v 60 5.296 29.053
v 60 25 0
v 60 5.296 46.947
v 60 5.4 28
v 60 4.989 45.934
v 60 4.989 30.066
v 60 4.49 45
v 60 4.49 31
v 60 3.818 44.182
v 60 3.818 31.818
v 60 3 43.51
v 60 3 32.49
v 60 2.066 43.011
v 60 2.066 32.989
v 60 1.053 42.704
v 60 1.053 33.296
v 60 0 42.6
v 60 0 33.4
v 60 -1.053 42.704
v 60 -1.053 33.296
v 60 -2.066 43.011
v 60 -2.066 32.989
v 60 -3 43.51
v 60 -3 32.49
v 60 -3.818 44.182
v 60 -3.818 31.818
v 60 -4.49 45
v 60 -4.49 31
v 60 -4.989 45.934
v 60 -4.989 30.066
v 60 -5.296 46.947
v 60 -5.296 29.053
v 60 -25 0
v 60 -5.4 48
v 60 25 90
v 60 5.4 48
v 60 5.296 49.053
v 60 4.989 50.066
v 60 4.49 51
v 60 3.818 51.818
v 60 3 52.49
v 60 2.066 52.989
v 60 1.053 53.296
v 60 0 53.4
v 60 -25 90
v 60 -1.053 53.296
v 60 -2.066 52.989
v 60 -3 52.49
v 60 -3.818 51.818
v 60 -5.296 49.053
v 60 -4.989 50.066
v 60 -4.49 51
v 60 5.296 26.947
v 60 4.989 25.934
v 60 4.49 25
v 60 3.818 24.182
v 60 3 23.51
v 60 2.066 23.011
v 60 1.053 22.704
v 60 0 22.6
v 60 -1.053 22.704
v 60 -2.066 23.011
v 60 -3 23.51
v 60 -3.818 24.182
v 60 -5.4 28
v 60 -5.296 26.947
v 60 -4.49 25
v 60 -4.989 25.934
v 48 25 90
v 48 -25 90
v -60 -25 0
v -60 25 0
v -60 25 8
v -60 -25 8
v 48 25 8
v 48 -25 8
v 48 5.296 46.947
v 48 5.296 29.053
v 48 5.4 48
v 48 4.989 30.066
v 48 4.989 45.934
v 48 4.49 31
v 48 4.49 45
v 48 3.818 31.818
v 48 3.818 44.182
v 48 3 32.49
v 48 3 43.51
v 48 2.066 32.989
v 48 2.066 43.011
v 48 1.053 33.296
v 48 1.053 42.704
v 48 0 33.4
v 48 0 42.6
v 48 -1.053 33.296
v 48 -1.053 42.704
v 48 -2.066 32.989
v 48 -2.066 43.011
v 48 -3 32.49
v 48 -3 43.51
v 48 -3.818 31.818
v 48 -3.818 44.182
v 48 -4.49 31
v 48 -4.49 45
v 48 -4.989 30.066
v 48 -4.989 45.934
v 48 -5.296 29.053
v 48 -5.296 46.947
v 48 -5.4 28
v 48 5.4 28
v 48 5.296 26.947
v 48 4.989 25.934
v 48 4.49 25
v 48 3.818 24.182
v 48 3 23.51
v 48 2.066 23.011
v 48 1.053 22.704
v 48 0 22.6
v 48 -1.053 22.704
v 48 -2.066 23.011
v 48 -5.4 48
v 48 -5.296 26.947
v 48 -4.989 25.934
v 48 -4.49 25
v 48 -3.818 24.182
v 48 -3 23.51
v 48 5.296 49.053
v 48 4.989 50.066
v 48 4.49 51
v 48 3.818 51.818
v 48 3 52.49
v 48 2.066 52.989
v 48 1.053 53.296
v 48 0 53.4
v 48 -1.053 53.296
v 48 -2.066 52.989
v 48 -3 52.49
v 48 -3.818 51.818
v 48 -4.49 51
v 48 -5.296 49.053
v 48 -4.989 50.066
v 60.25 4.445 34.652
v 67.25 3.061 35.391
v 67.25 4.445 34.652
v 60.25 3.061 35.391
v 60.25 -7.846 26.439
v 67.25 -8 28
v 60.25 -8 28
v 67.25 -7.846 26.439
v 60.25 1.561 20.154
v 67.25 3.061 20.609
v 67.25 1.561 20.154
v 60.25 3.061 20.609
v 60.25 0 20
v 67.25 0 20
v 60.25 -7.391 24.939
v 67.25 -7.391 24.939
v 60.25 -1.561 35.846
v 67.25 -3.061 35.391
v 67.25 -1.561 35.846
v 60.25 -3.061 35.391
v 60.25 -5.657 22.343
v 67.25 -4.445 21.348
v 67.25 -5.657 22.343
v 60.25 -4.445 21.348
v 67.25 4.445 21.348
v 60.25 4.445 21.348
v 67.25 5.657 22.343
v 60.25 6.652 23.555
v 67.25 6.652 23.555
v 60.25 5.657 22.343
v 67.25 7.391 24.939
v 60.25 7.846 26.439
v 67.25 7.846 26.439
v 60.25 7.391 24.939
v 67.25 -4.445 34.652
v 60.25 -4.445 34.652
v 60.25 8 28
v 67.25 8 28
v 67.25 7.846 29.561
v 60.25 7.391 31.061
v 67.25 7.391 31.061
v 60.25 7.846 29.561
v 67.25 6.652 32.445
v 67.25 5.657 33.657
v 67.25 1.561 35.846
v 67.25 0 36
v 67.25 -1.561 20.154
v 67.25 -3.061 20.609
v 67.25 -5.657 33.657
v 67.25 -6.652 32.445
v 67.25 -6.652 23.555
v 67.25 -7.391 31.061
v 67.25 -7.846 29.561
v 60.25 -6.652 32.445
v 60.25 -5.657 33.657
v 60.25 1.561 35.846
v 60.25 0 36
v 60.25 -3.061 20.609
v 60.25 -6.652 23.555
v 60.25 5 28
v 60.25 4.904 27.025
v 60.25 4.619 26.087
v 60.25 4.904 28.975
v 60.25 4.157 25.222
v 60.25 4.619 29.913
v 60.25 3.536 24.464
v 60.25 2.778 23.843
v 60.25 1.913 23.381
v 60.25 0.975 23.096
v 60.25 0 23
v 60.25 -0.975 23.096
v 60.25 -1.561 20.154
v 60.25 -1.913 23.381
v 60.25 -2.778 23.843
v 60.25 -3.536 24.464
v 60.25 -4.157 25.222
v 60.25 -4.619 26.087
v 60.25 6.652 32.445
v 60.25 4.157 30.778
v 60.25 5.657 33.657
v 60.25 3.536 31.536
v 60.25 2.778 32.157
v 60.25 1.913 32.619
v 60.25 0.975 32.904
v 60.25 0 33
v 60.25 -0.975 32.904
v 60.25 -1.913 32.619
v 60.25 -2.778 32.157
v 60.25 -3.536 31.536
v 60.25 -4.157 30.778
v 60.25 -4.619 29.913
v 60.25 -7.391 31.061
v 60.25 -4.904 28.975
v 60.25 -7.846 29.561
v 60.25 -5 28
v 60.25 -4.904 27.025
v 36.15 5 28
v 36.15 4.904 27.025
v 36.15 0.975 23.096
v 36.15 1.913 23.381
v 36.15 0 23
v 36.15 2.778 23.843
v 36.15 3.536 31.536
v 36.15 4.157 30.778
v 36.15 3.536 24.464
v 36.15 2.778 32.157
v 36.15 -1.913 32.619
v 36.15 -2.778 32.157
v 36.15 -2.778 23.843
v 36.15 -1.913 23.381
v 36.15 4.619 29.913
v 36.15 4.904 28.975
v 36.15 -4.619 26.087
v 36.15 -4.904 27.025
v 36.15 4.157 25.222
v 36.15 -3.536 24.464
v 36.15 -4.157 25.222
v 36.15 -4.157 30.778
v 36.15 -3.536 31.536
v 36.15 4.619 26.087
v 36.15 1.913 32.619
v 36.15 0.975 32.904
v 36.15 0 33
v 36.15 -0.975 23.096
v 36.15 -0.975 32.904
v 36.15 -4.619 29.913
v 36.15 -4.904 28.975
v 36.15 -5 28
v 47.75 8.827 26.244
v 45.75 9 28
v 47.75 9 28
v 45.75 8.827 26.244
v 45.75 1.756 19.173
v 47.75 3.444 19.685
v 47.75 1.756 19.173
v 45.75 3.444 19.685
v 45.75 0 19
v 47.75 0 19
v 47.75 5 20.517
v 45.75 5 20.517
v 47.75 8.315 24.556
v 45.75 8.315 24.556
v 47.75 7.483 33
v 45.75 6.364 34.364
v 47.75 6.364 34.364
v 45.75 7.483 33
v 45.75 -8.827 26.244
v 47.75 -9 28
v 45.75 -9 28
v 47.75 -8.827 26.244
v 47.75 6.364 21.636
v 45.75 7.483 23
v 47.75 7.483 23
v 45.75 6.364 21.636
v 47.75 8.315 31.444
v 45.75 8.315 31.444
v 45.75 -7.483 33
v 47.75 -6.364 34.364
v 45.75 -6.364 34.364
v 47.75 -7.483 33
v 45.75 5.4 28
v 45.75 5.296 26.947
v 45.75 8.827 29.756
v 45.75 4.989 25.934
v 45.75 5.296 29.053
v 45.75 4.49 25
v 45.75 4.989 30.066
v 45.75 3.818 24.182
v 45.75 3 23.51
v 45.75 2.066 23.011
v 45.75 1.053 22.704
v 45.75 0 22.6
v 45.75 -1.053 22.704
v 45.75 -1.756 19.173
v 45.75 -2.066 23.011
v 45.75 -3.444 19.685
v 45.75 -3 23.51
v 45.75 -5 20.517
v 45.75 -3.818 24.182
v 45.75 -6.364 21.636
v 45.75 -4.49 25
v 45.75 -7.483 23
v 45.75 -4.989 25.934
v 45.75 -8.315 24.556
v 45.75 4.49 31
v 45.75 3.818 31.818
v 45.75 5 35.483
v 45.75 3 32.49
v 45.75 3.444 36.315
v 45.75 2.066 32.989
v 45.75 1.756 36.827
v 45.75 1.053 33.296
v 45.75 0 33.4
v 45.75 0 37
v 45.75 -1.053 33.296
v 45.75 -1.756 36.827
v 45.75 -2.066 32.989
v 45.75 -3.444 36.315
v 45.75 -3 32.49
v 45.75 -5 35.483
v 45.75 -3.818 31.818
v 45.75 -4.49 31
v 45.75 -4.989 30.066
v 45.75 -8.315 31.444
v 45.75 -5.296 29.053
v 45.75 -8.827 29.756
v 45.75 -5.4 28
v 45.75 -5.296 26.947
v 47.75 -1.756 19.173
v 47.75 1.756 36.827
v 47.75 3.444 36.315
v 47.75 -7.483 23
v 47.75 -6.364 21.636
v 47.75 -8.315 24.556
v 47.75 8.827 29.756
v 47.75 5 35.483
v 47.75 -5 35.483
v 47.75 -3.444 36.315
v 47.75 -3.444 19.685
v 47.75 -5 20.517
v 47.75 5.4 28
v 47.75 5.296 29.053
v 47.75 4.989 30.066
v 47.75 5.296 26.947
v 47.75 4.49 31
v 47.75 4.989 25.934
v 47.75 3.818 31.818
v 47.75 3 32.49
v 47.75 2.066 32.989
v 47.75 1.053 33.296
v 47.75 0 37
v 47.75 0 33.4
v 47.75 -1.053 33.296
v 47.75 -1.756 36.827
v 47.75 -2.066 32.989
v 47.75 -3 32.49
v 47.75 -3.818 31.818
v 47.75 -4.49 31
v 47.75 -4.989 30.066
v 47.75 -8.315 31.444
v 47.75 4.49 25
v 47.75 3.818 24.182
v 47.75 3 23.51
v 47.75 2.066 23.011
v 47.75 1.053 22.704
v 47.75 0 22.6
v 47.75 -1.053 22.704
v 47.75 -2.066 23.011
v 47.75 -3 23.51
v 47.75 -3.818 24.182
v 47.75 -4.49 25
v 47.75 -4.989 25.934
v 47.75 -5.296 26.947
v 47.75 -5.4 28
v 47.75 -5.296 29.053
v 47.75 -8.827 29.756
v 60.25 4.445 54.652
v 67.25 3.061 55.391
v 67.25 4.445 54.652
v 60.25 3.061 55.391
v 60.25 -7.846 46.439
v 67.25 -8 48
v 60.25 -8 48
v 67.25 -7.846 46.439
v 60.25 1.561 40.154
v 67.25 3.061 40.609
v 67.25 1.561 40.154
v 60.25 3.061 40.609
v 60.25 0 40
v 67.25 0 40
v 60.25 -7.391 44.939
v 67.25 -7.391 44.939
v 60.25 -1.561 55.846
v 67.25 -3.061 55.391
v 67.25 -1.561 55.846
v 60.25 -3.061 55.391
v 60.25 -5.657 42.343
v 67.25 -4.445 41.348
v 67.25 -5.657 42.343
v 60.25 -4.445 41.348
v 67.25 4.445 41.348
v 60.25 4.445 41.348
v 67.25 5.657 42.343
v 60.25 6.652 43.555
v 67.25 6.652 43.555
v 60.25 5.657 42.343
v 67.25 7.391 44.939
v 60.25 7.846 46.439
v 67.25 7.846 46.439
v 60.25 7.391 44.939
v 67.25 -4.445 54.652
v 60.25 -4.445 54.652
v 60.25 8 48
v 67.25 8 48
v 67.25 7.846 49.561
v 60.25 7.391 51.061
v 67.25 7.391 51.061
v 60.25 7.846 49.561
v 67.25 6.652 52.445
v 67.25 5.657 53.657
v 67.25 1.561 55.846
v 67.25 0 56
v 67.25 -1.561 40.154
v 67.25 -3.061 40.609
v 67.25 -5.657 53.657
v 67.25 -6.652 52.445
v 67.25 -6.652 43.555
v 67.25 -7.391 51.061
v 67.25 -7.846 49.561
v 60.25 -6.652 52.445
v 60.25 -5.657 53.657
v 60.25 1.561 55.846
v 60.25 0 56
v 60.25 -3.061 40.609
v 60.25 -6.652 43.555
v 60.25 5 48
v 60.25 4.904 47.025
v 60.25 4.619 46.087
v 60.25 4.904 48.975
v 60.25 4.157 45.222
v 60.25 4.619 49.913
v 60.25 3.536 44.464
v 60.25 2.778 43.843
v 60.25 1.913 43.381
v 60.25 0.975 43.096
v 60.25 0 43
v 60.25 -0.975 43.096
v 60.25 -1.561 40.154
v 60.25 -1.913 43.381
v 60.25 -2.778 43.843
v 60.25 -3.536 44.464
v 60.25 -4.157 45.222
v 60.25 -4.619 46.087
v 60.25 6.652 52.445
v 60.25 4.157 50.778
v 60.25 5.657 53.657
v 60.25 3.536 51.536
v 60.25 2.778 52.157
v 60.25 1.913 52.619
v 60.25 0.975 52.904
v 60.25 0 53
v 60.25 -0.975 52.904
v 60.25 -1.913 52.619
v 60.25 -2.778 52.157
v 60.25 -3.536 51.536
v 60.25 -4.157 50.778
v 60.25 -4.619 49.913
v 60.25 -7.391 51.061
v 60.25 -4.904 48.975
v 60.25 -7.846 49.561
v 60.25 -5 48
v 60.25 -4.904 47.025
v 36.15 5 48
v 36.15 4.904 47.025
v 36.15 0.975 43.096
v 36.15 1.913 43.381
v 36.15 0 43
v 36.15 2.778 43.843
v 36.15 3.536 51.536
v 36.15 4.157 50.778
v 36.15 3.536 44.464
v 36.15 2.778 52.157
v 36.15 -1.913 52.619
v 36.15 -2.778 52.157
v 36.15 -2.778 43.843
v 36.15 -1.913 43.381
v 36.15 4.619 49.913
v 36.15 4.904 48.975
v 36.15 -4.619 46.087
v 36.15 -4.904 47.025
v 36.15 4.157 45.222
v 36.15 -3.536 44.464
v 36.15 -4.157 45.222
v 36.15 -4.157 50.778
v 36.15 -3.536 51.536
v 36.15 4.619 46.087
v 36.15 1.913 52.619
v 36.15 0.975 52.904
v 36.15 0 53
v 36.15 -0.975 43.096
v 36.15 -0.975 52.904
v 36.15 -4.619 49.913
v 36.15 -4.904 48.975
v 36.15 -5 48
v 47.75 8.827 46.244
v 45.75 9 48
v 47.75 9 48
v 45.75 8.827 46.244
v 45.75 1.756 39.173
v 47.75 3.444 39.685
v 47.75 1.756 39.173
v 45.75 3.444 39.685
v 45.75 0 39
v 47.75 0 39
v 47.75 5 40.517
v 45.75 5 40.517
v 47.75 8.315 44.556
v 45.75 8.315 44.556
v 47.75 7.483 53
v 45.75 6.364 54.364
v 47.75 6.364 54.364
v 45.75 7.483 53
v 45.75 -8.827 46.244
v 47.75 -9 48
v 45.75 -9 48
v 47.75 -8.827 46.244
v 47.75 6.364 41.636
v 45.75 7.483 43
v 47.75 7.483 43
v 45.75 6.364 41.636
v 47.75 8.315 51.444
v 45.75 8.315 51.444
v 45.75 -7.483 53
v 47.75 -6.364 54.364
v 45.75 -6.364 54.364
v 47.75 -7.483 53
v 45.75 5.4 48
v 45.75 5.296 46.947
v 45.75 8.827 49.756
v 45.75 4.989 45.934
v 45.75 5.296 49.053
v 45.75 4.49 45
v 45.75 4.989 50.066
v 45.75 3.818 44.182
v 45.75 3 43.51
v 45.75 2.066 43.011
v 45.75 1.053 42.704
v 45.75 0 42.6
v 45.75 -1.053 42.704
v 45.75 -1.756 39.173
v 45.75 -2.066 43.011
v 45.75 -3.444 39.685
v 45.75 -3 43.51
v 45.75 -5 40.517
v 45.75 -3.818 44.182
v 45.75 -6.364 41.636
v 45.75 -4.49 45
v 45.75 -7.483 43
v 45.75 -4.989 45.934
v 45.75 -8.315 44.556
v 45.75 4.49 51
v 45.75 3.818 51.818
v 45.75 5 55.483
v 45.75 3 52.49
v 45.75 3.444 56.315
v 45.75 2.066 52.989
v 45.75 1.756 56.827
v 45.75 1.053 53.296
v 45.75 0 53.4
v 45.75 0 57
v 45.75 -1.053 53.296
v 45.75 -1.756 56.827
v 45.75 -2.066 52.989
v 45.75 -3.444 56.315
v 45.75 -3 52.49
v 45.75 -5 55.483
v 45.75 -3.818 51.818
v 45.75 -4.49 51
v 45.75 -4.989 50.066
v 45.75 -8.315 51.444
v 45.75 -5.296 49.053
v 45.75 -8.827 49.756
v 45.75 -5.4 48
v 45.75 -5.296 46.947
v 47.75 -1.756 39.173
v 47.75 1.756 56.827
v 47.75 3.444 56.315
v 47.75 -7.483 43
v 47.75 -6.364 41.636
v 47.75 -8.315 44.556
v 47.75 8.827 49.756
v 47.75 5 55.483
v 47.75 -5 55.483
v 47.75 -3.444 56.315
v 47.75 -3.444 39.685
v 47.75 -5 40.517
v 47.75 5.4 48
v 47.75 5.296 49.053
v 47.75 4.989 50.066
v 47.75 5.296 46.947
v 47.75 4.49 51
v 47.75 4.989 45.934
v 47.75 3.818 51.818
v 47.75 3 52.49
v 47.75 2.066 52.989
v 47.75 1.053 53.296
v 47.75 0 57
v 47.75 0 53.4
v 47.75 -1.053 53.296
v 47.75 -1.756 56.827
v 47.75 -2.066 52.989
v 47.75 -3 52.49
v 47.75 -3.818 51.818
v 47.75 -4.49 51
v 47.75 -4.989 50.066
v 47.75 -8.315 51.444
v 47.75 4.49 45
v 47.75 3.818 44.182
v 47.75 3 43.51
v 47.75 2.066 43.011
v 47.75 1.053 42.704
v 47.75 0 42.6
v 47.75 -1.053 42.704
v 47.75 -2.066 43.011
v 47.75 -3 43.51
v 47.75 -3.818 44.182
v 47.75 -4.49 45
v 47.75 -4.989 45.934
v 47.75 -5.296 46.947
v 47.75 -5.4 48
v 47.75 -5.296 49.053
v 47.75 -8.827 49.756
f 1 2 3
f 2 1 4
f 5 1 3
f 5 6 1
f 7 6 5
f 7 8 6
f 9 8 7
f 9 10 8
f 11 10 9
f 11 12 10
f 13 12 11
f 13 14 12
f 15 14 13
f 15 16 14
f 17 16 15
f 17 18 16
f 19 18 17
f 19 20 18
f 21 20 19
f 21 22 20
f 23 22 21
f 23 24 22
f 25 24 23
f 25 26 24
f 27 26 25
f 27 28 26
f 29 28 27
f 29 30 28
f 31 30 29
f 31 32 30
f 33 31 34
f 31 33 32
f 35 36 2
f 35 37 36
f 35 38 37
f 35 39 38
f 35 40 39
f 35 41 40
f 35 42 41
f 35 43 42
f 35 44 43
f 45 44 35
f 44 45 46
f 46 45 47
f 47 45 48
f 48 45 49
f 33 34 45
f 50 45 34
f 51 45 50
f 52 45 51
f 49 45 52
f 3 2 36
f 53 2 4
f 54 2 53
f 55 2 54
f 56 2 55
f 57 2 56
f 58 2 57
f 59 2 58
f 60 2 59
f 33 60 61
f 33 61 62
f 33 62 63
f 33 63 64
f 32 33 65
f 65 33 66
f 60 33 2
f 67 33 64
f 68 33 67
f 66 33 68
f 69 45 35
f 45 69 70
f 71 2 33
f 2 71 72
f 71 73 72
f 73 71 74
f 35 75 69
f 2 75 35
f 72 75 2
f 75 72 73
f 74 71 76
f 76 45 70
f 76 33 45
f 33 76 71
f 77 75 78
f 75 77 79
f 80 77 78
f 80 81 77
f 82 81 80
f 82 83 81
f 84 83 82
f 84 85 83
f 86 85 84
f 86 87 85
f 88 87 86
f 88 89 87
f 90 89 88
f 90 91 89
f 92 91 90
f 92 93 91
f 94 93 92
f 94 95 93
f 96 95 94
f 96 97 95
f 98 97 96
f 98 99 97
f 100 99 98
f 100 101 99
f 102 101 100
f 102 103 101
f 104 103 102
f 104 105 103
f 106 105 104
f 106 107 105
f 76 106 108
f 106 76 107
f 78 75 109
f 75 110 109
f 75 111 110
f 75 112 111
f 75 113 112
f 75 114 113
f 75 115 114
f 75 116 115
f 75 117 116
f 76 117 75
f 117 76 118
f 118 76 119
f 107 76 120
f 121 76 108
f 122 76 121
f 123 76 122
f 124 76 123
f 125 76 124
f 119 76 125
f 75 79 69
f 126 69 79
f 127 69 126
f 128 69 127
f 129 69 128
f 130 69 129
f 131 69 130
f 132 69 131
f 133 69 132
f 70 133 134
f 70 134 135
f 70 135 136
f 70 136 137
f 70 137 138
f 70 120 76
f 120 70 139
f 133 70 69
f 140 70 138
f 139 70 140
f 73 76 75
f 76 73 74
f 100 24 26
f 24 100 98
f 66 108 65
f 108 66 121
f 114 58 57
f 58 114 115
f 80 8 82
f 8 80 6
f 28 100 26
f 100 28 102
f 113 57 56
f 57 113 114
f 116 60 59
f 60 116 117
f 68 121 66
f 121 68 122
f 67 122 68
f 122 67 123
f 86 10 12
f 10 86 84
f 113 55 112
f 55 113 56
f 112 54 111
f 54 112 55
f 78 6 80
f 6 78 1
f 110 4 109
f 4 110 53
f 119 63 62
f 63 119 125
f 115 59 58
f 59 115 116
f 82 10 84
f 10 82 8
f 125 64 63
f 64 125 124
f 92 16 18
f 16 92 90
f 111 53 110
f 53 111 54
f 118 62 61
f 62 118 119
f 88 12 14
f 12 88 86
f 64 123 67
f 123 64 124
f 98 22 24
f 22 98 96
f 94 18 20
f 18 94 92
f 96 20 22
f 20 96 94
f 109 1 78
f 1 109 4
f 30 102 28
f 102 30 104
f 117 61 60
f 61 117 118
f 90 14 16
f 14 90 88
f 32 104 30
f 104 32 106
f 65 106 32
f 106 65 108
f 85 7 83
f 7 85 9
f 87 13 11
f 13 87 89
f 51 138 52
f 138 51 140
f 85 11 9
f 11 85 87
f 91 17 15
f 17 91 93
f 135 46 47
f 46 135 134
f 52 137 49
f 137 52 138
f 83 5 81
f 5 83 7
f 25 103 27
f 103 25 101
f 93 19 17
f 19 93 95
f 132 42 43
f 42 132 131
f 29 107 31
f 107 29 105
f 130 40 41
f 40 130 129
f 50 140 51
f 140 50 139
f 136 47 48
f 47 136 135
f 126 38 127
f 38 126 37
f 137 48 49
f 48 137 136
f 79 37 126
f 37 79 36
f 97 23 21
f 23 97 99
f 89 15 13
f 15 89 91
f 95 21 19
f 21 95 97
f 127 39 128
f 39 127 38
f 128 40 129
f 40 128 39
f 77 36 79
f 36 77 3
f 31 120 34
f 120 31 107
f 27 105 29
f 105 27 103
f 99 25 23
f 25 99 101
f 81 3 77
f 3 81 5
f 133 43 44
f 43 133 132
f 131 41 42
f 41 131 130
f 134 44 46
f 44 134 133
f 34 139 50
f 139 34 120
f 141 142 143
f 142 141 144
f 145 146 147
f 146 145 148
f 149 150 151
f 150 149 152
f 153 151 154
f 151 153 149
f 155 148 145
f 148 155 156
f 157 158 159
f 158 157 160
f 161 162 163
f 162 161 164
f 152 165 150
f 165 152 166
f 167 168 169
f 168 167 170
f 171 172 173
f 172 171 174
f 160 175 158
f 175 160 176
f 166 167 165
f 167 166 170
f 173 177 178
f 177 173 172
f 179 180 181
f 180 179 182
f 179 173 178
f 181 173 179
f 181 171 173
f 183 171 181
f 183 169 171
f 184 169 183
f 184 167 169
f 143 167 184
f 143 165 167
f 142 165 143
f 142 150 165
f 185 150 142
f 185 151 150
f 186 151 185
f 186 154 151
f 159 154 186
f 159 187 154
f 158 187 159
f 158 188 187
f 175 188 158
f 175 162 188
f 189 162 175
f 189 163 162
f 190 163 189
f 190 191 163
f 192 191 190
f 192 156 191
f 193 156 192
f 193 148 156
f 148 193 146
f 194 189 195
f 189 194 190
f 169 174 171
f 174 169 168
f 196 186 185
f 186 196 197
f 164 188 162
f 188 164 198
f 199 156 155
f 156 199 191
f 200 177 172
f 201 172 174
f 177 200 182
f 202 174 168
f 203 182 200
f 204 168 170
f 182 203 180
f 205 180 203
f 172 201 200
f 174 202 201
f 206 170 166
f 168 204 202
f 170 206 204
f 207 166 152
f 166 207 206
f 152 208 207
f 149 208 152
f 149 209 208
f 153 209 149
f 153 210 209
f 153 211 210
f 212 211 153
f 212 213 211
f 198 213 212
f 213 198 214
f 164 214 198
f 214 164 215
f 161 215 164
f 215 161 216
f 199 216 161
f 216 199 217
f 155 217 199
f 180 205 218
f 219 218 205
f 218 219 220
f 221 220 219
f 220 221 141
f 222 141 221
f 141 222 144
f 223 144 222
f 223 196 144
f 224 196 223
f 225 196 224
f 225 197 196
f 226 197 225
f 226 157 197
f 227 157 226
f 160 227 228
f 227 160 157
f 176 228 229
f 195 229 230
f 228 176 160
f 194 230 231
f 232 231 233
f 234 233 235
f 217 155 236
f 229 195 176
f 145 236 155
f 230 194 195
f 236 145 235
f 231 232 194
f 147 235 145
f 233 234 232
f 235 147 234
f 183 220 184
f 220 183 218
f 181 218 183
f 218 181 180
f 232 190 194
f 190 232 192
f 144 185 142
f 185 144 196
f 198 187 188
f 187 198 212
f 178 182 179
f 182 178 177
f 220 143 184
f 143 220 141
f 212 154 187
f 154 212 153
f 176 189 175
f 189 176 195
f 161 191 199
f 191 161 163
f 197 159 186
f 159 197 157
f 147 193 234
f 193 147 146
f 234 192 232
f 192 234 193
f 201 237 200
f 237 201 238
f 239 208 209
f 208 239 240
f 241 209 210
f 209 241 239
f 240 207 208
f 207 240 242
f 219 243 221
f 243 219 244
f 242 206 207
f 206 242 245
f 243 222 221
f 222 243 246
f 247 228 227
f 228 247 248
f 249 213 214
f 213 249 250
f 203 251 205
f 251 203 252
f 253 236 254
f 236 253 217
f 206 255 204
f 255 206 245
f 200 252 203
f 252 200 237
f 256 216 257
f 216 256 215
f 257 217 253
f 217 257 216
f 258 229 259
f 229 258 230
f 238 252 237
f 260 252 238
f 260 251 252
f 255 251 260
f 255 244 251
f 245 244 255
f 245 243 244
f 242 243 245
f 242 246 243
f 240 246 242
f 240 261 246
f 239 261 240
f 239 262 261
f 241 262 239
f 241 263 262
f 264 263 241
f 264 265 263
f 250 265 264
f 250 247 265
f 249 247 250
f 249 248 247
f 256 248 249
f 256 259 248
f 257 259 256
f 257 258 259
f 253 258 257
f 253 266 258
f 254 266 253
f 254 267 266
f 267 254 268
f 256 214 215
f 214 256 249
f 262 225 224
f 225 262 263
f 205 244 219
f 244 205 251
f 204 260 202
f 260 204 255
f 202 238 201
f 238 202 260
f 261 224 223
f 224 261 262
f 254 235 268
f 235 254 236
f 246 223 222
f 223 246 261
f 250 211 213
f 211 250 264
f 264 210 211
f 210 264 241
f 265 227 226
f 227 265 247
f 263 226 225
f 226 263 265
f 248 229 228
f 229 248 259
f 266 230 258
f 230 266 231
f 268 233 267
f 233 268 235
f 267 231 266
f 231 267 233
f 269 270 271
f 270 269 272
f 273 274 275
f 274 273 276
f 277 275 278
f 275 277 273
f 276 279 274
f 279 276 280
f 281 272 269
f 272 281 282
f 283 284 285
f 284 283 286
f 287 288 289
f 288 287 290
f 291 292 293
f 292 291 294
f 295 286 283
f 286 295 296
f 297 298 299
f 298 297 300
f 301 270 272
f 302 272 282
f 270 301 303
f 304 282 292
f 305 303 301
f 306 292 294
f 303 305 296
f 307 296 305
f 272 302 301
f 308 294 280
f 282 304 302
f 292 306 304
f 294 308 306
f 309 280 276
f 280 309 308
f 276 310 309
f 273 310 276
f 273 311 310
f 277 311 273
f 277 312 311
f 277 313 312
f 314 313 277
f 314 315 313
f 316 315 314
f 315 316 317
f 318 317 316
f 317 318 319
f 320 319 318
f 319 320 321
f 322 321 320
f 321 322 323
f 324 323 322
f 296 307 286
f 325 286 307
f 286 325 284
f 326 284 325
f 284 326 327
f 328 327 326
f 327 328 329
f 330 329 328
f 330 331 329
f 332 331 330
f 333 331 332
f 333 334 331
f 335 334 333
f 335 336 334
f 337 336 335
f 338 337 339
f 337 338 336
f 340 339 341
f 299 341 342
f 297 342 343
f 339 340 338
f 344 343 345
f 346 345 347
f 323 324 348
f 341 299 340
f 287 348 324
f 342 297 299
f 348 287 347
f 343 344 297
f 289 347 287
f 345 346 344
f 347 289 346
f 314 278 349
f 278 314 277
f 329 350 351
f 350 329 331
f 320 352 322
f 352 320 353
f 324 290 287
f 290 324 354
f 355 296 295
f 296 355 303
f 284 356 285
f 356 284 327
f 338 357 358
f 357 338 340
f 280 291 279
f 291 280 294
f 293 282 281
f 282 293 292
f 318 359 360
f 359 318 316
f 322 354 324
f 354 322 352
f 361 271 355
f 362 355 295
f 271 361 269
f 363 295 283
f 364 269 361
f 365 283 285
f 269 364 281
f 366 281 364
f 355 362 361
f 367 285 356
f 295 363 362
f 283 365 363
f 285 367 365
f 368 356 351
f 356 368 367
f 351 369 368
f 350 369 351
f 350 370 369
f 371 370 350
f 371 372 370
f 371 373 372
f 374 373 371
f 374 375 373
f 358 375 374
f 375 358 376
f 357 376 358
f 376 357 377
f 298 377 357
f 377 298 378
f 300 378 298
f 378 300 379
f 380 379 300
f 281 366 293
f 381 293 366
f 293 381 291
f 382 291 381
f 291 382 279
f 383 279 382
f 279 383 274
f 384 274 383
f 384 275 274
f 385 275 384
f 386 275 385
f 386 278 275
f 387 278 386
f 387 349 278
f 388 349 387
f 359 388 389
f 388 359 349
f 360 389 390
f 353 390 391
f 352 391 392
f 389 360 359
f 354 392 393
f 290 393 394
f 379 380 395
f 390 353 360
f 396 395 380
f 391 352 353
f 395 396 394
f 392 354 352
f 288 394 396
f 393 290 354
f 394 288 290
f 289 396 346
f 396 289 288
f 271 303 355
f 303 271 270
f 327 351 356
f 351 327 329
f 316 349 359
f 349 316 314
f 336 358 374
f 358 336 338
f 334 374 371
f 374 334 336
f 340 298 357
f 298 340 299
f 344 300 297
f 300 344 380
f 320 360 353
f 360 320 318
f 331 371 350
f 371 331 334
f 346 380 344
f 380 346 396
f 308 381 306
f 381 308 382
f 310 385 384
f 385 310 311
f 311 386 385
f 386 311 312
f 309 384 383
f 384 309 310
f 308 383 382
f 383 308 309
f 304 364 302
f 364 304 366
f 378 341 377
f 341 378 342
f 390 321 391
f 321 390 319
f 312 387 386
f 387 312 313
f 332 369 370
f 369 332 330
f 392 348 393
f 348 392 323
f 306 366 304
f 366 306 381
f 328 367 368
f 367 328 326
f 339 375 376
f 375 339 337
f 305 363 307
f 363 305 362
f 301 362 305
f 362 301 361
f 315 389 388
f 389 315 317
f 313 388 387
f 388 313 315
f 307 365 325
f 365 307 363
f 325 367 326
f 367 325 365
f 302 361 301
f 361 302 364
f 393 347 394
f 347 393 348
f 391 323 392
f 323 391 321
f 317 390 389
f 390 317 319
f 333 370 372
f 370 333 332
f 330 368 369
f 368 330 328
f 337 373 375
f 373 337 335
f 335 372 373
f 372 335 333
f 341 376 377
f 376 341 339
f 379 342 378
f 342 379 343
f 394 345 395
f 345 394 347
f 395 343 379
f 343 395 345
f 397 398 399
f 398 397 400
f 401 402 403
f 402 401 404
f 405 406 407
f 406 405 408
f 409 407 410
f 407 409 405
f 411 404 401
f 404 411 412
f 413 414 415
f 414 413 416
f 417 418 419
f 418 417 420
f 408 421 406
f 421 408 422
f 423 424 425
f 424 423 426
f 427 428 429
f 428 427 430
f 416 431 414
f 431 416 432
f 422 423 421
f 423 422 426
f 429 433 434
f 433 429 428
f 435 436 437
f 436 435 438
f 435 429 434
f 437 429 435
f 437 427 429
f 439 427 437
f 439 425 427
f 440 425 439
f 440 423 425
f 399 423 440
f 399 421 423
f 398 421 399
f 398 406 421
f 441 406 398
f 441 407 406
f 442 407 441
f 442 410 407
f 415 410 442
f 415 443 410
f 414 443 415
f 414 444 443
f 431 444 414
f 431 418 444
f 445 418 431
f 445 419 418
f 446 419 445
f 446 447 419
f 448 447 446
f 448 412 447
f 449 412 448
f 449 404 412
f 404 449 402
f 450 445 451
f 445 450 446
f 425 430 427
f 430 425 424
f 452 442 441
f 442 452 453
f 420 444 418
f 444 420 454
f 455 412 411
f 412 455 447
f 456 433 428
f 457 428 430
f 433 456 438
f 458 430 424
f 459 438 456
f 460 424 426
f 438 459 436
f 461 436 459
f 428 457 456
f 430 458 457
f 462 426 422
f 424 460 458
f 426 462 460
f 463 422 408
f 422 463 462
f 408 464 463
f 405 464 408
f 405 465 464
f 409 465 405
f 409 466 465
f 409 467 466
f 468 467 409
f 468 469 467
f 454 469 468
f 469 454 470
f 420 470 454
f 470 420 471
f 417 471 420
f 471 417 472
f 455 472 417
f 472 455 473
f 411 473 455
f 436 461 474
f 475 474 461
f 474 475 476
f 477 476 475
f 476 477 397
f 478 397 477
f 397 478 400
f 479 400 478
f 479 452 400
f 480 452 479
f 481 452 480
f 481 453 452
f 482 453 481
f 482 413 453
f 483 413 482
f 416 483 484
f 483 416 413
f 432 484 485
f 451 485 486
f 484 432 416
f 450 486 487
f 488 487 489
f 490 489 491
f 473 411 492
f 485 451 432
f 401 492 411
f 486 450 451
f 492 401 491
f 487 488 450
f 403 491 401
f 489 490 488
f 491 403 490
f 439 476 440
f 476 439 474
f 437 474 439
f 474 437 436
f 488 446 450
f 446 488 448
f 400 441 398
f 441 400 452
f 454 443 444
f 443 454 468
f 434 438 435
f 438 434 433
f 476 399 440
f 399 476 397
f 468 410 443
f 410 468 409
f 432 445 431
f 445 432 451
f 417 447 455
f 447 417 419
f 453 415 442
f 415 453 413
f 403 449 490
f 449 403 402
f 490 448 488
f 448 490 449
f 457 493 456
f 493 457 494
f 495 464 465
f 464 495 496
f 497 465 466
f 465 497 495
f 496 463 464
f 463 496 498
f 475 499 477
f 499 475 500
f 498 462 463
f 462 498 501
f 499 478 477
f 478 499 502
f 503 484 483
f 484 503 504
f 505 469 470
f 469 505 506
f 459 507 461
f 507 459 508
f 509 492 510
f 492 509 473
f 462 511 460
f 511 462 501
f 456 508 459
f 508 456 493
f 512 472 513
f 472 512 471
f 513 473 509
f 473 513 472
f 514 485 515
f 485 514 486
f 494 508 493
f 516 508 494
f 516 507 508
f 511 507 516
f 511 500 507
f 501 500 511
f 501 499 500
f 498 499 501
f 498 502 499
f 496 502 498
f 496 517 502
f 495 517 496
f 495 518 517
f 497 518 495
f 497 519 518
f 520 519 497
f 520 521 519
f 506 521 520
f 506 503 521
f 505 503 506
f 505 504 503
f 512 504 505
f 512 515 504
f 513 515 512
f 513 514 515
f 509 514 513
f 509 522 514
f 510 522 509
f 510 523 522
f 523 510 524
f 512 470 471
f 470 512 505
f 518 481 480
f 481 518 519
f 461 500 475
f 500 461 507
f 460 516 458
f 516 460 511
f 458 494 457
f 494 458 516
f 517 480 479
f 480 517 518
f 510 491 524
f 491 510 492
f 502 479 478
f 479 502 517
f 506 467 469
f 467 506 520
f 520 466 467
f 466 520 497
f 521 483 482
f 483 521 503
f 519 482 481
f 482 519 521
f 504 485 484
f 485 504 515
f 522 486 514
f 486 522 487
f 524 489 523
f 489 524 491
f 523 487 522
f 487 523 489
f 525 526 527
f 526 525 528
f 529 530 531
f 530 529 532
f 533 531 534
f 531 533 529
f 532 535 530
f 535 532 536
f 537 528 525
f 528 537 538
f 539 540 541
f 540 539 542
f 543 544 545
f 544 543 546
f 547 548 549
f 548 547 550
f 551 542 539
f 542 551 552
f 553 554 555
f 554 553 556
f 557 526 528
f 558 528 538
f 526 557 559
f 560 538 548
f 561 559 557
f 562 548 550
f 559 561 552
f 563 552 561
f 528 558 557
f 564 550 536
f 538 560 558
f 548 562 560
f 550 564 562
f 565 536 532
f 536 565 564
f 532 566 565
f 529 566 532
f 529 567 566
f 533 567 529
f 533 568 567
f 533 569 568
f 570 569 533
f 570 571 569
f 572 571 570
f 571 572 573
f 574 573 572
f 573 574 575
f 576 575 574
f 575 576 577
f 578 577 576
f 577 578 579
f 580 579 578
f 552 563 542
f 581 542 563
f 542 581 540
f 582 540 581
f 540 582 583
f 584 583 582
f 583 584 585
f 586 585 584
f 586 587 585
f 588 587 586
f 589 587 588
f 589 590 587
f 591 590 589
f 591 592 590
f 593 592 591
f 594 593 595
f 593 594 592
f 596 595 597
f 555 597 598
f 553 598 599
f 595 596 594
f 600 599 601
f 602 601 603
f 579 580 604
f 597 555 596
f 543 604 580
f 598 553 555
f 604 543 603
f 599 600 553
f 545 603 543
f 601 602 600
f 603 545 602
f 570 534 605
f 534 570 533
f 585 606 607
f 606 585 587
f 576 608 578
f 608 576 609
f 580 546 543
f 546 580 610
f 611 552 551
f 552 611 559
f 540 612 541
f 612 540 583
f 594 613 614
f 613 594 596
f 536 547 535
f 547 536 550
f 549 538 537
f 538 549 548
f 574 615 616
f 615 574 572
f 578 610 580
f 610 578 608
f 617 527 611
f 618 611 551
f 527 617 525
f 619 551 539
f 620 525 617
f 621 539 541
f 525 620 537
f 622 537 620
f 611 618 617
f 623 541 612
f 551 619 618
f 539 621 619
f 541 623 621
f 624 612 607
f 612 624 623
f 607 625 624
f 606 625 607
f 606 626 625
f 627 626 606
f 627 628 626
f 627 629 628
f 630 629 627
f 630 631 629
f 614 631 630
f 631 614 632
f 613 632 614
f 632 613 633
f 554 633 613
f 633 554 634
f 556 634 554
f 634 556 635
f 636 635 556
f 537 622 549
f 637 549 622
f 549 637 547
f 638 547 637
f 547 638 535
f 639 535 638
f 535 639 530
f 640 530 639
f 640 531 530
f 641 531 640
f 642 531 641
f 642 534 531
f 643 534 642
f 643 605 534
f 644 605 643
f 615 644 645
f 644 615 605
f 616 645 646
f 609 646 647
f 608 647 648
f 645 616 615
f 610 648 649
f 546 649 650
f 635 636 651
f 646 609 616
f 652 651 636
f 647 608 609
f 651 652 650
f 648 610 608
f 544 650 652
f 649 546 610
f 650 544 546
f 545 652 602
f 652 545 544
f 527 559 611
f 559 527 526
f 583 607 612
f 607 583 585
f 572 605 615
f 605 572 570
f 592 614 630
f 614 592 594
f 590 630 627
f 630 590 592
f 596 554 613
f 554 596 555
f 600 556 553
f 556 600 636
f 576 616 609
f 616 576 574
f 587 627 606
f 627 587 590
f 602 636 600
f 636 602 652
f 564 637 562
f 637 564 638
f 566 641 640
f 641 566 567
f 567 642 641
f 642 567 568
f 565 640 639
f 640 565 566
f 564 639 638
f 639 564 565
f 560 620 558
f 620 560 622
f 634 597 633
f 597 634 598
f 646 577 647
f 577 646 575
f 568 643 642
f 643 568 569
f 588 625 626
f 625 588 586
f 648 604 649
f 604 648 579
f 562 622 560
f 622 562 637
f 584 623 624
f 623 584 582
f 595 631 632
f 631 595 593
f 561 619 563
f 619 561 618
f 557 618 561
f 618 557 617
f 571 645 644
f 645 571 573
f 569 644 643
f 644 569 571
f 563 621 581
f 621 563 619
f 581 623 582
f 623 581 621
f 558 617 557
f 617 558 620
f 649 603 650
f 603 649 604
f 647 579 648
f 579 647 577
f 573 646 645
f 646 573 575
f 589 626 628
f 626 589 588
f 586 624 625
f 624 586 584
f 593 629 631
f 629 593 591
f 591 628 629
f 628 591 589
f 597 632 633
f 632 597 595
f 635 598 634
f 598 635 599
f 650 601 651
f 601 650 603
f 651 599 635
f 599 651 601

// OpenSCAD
$fn = 32;

// ------------------------------------------------------------------------
// Bolted bracket: 120 x 50 mm bracket with 2 bolt joints
// Every part is its own module, assembly() places them once.
// ------------------------------------------------------------------------

// --- part 1 ---
module bracket() {
  difference() {
    translate([-60, -25, 0]) cube([120, 50, 90]);
    translate([-61, -26, 8]) cube([109, 52, 83]);
    translate([54, 0, 28]) rotate([0, 90, 0]) cylinder(h = 14, d = 10.8, center = true);
    translate([54, 0, 48]) rotate([0, 90, 0]) cylinder(h = 14, d = 10.8, center = true);
  }
}

// --- part 2 ---
module bolt1() {
  cylinder(h = 7, d = 16);
  translate([0, 0, -24.1]) cylinder(h = 24.1, d = 10);
}

// --- part 3 ---
module washer1() {
  difference() {
      translate([0, 0, 0]) cylinder(h = 2, d = 18);
      translate([0, 0, -1]) cylinder(h = 4, d = 10.8);
    }
}

// --- part 4 ---
module bolt2() {
  cylinder(h = 7, d = 16);
  translate([0, 0, -24.1]) cylinder(h = 24.1, d = 10);
}

// --- part 5 ---
module washer2() {
  difference() {
      translate([0, 0, 0]) cylinder(h = 2, d = 18);
      translate([0, 0, -1]) cylinder(h = 4, d = 10.8);
    }
}

// --- assembly ---
module assembly() {
  translate([0, 0, 0]) rotate([0, 0, 0]) bracket();
  translate([60.25, 0, 28]) rotate([0, 90, 0]) bolt1();
  translate([45.75, 0, 28]) rotate([0, 90, 0]) washer1();
  translate([60.25, 0, 48]) rotate([0, 90, 0]) bolt2();
  translate([45.75, 0, 48]) rotate([0, 90, 0]) washer2();
}

assembly();
